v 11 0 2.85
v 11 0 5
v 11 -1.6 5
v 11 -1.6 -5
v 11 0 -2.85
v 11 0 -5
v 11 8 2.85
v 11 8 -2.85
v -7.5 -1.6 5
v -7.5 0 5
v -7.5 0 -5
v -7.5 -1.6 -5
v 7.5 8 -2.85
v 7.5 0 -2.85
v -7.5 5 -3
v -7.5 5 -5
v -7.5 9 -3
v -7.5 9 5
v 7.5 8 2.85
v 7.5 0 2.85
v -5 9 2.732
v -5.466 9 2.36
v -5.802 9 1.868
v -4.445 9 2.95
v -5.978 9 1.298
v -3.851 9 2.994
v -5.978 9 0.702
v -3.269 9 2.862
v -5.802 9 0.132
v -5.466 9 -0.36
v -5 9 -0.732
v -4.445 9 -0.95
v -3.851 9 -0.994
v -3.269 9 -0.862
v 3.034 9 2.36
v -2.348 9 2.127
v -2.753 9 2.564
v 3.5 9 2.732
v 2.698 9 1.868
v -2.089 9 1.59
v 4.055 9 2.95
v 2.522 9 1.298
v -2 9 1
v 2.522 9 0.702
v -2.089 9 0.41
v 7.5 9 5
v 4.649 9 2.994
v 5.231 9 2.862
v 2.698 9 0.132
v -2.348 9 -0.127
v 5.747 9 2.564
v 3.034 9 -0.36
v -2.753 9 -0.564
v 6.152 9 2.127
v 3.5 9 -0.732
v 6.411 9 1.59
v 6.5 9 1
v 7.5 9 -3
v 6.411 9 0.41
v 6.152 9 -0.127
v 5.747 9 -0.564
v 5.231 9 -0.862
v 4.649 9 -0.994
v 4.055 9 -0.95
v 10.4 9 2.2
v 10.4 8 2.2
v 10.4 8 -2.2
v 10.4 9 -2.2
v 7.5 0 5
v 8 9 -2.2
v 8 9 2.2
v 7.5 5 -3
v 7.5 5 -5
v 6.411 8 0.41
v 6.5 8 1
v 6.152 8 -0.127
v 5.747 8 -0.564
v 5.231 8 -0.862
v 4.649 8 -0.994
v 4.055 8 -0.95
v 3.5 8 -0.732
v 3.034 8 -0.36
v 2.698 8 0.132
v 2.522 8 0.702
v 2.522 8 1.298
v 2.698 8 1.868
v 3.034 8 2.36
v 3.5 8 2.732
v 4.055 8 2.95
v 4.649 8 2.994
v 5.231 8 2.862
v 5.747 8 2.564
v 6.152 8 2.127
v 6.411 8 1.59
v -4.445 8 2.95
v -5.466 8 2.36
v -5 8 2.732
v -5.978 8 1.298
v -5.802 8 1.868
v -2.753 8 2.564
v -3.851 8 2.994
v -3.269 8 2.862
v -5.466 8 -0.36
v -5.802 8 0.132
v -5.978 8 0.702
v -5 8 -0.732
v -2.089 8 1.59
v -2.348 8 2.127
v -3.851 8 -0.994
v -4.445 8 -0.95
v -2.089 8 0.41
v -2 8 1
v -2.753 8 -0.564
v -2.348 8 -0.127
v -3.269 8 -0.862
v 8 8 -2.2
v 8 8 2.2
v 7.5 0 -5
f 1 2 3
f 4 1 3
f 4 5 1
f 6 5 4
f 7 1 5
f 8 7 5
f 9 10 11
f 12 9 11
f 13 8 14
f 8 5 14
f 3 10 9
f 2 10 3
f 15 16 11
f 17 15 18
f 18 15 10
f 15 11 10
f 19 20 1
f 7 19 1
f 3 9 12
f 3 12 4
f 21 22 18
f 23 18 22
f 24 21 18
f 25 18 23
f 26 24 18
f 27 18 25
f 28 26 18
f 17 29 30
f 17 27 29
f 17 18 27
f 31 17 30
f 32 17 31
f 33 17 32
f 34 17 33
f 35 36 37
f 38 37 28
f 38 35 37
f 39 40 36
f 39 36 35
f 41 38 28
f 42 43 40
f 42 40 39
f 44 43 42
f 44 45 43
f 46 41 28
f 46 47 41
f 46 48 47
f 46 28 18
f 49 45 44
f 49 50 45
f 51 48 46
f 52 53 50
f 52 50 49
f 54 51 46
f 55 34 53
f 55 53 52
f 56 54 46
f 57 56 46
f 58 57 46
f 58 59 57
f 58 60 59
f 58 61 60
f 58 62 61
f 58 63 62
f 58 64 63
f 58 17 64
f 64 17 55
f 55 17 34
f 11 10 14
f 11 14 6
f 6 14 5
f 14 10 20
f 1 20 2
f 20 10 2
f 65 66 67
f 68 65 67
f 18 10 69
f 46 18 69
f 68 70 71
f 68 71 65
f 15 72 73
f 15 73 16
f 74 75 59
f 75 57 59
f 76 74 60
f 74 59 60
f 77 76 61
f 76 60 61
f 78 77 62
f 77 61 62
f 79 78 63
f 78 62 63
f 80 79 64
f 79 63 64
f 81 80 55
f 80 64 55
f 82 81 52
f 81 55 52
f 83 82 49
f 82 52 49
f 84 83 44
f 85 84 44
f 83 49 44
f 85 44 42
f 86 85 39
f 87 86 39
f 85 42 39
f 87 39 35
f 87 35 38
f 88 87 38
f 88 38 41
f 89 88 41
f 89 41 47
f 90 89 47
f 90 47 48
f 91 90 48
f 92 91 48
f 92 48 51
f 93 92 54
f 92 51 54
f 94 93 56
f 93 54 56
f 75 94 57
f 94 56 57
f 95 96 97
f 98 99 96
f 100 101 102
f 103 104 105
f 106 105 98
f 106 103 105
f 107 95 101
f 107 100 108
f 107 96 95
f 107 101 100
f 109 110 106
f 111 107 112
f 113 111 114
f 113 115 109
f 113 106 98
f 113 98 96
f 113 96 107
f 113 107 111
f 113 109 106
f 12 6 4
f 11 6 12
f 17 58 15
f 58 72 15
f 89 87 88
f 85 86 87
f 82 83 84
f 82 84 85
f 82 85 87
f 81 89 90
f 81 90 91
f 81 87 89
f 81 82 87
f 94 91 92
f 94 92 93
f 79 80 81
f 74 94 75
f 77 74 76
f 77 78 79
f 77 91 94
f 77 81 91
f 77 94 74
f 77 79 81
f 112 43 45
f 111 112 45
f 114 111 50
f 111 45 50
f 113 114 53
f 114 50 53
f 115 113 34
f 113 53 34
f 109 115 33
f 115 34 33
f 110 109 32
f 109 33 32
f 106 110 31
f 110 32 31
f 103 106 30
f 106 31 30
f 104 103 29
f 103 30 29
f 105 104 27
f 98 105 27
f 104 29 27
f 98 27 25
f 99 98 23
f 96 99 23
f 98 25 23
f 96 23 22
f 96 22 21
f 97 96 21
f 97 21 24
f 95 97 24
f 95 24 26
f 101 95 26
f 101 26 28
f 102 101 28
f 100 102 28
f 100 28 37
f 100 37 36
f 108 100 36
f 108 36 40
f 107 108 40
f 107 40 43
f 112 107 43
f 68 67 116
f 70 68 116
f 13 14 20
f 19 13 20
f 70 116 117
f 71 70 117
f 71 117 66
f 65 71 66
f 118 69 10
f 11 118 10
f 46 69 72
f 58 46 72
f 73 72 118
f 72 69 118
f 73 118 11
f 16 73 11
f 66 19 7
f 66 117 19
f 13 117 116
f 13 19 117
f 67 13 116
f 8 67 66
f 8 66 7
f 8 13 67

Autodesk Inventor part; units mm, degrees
sketch "Szkic1" plane through (0, 0, 0) normal (0, 1, 0) x (-1, 0, 0)
  line L0 (7.5, 5) -> (-7.5, 5)
  line L1 (-7.5, 5) -> (-7.5, -5)
  line L2 (-7.5, -5) -> (7.5, -5)
  line L3 (7.5, -5) -> (7.5, 5)
  point P0 (0, 0)
  dimension "d0" = 10
  dimension "d1" = 15
  dimension "d2" = 5
  dimension "d3" = 7.5
extrude "Wyciągnięcie proste1" add sketch "Szkic1" along normal blind 5
sketch "Szkic2" plane through (0, 5, 0) normal (0, 1, 0) x (1, 0, 0)
  line L0 (-7.5, -5) -> (7.5, -5) projected
  line L1 (7.5, -5) -> (7.5, 5) projected
  line L2 (-7.5, -5) -> (7.5, -5)
  line L3 (7.5, -5) -> (7.5, 3)
  line L4 (7.5, 3) -> (-7.5, 3)
  line L5 (-7.5, 3) -> (-7.5, -5)
  point P0 (0, 0)
  dimension "d6" = 8
extrude "Wyciągnięcie proste2" add sketch "Szkic2" along normal blind 4
sketch "Szkic3" plane through (0, 9, 0) normal (0, 1, 0) x (1, 0, 0)
  circle A0 centre (-4, -1) radius 2
  line L0 (-7.5, 3) -> (-7.5, -5) projected
  line L1 (7.5, 3) -> (-7.5, 3) projected
  circle A1 centre (4.5, -1) radius 2
  line L2 (7.5, -5) -> (7.5, 3) projected
  point P0 (0, 0)
  dimension "d9" = 4
  dimension "d10" = 3.5
  dimension "d11" = 4
  dimension "d12" = 3
  dimension "d13" = 4
  dimension "d14" = 4
extrude "Wyciągnięcie proste3" cut sketch "Szkic3" against normal blind 1
sketch "Sketch4" plane through (0, 0, 0) normal (0, -1, 0) x (1, 0, 0)
  line L0 (-7.5, 5) -> (7.5, 5) projected
  line L1 (7.5, -5) -> (-7.5, -5) projected
  line L2 (7.5, 5) -> (-7.5, 5)
  line L3 (-7.5, 5) -> (-7.5, -5)
  line L4 (-7.5, -5) -> (7.5, -5)
  line L5 (7.5, 5) -> (11, 5)
  line L6 (11, 5) -> (11, -5)
  line L7 (11, -5) -> (7.5, -5)
  line L8 (7.5, -5) -> (-7.5, -5) projected
  line L9 (-7.5, -5) -> (-7.5, 5) projected
  point P0 (0, 0)
  dimension "d19" = 18.5
extrude "Extrusion4" add sketch "Sketch4" along normal blind 1.6 separate body
sketch "Sketch5" plane through (0, 0, 0) normal (0, 1, 0) x (1, 0, 0)
  line L0 (11, 2.85) -> (7.5, 2.85)
  line L1 (7.5, 2.85) -> (7.5, -2.85)
  line L2 (7.5, -2.85) -> (11, -2.85)
  line L3 (11, -2.85) -> (11, 2.85)
  line L4 (-7.5, 5) -> (11, 5) projected
  line L5 (7.5, -5) -> (7.5, 3) projected
  point P0 (0, 0)
  dimension "d20" = 3.5
  dimension "d21" = 5.7
  dimension "d22" = 2.15
  dimension "d23" = 0
extrude "Extrusion5" add sketch "Sketch5" along normal blind 8 bodies 2
sketch "Sketch7" plane through (0, 8, 0) normal (0, 1, 0) x (1, 0, 0)
  line L0 (10.4, 2.2) -> (8, 2.2)
  line L1 (8, 2.2) -> (8, -2.2)
  line L2 (8, -2.2) -> (10.4, -2.2)
  line L3 (10.4, -2.2) -> (10.4, 2.2)
  line L4 (7.5, -2.85) -> (11, -2.85) projected
  line L5 (7.5, 2.85) -> (7.5, -2.85) projected
  point P0 (0, 0)
  dimension "d32" = 4.4
  dimension "d33" = 0.65
  dimension "d34" = 2.4
  dimension "d35" = 0.5
extrude "Extrusion7" add sketch "Sketch7" along normal blind 1 bodies 2
ref_plane "Work Plane1" through (-7.5, 0, 3) normal (0, 0, 1) x (1, 0, 0)
ref_plane "Work Plane2" through (8, 8, 1.2) normal (0, 0, 1) x (1, 0, 0)
ref_plane "Work Plane3" through (10.4, 8, -1.2) normal (0, 0, -1) x (-1, 0, 0)
ref_plane "Work Plane4" through (-7.5, 0, 0) normal (0, 0, 1) x (1, 0, 0)
sketch "Sketch9" plane through (8, 8, 1.2) normal (0, 0, 1) x (1, 0, 0)
  line L0 (1.4, 1) -> (2.3459, 4)
  line L1 (2.3459, 4) -> (0.0541, 4)
  line L2 (0.0541, 4) -> (1, 1)
  line L3 (1, 1) -> (1.4, 1)
  line L4 (0, 1) -> (2.4, 1) projected
  line L5 (2.4, 0) -> (2.4, 1) projected
  line L6 (2.4, 1) -> (0, 1) construction
  line L7 (1.2, 1) -> (1.2, 8.0865) construction
  line L8 (-15.5, 1) -> (-0.5, 1) construction
  line L9 (1.2, 1) -> (1.2, 4)
  point P0 (-8, -8)
  dimension "d47" = 0.4
  dimension "d48" = 0
  dimension "d49" = 1
  dimension "d50" = 17.5
  dimension "d51" = 35
  dimension "d53" = 3
properties part number "Sharp_Czujnik_Linia"
